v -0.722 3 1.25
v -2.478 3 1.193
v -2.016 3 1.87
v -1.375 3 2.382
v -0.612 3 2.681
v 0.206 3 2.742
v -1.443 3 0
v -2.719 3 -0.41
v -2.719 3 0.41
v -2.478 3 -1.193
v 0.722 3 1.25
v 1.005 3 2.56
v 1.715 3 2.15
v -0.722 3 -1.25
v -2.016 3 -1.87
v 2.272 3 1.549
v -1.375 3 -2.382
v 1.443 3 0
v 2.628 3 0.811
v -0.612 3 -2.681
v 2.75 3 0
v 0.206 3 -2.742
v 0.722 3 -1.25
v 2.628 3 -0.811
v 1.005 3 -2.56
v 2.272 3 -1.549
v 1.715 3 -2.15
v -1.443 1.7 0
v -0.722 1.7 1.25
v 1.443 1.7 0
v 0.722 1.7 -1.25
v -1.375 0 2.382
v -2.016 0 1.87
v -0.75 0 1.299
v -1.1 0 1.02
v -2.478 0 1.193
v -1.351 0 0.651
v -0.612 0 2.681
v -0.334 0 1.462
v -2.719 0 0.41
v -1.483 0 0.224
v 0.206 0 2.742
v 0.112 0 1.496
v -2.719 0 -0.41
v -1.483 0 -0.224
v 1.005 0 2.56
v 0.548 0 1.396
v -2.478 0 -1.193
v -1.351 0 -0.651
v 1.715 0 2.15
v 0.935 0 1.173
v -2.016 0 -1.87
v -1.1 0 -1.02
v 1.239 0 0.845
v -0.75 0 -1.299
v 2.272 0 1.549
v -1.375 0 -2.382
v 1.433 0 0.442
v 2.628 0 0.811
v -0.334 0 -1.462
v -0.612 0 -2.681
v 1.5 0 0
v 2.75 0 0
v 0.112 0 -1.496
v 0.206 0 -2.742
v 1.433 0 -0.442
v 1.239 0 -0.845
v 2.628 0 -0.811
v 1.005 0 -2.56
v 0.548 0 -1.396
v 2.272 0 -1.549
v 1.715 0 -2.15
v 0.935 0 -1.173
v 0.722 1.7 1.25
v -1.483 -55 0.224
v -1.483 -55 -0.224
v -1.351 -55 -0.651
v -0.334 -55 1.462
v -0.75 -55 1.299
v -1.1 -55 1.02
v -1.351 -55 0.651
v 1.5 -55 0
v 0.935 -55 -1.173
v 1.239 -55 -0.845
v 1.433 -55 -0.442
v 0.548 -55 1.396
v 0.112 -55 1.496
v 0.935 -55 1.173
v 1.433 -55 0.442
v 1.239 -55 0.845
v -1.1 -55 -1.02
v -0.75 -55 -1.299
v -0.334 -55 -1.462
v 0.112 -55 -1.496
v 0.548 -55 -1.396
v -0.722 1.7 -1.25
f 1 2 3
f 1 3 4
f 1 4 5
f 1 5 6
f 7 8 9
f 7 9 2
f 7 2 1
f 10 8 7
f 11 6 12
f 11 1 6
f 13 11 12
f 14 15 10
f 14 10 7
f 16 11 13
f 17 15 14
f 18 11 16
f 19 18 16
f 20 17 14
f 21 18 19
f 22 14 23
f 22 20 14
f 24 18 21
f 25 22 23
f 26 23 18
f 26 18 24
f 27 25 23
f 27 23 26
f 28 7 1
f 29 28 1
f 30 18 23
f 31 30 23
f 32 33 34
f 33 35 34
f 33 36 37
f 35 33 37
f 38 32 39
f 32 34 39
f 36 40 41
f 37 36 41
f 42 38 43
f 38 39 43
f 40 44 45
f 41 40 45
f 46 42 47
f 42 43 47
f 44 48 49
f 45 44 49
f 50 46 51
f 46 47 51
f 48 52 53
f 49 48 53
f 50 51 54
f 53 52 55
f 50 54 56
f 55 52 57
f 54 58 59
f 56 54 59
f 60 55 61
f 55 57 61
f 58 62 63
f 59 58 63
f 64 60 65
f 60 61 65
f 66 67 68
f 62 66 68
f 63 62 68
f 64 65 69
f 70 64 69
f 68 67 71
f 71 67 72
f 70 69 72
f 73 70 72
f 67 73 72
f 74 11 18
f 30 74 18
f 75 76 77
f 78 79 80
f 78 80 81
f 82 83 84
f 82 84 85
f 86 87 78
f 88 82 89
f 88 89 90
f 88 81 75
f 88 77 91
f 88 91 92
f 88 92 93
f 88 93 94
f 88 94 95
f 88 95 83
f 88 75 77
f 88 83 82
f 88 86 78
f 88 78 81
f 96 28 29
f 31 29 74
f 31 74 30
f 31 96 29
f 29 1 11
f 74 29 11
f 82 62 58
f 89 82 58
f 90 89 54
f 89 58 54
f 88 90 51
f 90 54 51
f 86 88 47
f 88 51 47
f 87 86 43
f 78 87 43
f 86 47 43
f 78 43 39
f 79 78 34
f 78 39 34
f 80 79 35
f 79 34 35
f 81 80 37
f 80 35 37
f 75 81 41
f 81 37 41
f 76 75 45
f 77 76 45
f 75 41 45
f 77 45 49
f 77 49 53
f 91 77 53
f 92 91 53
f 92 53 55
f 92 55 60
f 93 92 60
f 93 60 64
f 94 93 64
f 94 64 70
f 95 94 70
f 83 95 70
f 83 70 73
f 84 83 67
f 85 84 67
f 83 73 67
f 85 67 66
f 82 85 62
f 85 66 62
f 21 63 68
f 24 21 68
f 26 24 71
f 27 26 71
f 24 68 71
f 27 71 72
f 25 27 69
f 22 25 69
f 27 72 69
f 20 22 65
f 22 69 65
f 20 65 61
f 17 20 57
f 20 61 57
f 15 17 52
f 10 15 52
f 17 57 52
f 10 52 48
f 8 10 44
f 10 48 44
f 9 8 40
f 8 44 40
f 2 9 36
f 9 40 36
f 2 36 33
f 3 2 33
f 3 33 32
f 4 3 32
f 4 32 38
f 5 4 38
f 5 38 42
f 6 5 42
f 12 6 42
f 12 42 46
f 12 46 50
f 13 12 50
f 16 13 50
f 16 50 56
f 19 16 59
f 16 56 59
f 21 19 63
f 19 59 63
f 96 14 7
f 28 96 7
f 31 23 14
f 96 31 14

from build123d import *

# Parameters (mm, degrees)
SKETCH_1_R            = 2.75
EXTRUDE_248_DEPTH     = 3
CUT_EXTRUDE_378_DEPTH = 1.3
SKETCH_3_R            = 1.5
EXTRUDE_479_DEPTH     = 55


with BuildPart() as part:
    # 草图1 → Extrude 248 (new body)
    with BuildSketch(Plane(origin=(0, 0, 0), x_dir=(1, 0, 0), z_dir=(0, 1, 0))):
        Circle(SKETCH_1_R)
    extrude(amount=EXTRUDE_248_DEPTH)

    # 草图2 → Cut-Extrude 378 (cut)
    with BuildSketch(Plane(origin=(0, 3, 0), x_dir=(1, 0, 0), z_dir=(0, 1, 0))):
        Polygon((1.443375673, 0), (0.721687836, 1.25), (-0.721687836, 1.25), (-1.443375673, 0), (-0.721687836, -1.25), (0.721687836, -1.25), align=None)
    extrude(amount=-CUT_EXTRUDE_378_DEPTH, mode=Mode.SUBTRACT)

    # 草图3 → Extrude 479 (add)
    with BuildSketch(Plane.XZ):
        Circle(SKETCH_3_R)
    extrude(amount=EXTRUDE_479_DEPTH)


solid = part.part
